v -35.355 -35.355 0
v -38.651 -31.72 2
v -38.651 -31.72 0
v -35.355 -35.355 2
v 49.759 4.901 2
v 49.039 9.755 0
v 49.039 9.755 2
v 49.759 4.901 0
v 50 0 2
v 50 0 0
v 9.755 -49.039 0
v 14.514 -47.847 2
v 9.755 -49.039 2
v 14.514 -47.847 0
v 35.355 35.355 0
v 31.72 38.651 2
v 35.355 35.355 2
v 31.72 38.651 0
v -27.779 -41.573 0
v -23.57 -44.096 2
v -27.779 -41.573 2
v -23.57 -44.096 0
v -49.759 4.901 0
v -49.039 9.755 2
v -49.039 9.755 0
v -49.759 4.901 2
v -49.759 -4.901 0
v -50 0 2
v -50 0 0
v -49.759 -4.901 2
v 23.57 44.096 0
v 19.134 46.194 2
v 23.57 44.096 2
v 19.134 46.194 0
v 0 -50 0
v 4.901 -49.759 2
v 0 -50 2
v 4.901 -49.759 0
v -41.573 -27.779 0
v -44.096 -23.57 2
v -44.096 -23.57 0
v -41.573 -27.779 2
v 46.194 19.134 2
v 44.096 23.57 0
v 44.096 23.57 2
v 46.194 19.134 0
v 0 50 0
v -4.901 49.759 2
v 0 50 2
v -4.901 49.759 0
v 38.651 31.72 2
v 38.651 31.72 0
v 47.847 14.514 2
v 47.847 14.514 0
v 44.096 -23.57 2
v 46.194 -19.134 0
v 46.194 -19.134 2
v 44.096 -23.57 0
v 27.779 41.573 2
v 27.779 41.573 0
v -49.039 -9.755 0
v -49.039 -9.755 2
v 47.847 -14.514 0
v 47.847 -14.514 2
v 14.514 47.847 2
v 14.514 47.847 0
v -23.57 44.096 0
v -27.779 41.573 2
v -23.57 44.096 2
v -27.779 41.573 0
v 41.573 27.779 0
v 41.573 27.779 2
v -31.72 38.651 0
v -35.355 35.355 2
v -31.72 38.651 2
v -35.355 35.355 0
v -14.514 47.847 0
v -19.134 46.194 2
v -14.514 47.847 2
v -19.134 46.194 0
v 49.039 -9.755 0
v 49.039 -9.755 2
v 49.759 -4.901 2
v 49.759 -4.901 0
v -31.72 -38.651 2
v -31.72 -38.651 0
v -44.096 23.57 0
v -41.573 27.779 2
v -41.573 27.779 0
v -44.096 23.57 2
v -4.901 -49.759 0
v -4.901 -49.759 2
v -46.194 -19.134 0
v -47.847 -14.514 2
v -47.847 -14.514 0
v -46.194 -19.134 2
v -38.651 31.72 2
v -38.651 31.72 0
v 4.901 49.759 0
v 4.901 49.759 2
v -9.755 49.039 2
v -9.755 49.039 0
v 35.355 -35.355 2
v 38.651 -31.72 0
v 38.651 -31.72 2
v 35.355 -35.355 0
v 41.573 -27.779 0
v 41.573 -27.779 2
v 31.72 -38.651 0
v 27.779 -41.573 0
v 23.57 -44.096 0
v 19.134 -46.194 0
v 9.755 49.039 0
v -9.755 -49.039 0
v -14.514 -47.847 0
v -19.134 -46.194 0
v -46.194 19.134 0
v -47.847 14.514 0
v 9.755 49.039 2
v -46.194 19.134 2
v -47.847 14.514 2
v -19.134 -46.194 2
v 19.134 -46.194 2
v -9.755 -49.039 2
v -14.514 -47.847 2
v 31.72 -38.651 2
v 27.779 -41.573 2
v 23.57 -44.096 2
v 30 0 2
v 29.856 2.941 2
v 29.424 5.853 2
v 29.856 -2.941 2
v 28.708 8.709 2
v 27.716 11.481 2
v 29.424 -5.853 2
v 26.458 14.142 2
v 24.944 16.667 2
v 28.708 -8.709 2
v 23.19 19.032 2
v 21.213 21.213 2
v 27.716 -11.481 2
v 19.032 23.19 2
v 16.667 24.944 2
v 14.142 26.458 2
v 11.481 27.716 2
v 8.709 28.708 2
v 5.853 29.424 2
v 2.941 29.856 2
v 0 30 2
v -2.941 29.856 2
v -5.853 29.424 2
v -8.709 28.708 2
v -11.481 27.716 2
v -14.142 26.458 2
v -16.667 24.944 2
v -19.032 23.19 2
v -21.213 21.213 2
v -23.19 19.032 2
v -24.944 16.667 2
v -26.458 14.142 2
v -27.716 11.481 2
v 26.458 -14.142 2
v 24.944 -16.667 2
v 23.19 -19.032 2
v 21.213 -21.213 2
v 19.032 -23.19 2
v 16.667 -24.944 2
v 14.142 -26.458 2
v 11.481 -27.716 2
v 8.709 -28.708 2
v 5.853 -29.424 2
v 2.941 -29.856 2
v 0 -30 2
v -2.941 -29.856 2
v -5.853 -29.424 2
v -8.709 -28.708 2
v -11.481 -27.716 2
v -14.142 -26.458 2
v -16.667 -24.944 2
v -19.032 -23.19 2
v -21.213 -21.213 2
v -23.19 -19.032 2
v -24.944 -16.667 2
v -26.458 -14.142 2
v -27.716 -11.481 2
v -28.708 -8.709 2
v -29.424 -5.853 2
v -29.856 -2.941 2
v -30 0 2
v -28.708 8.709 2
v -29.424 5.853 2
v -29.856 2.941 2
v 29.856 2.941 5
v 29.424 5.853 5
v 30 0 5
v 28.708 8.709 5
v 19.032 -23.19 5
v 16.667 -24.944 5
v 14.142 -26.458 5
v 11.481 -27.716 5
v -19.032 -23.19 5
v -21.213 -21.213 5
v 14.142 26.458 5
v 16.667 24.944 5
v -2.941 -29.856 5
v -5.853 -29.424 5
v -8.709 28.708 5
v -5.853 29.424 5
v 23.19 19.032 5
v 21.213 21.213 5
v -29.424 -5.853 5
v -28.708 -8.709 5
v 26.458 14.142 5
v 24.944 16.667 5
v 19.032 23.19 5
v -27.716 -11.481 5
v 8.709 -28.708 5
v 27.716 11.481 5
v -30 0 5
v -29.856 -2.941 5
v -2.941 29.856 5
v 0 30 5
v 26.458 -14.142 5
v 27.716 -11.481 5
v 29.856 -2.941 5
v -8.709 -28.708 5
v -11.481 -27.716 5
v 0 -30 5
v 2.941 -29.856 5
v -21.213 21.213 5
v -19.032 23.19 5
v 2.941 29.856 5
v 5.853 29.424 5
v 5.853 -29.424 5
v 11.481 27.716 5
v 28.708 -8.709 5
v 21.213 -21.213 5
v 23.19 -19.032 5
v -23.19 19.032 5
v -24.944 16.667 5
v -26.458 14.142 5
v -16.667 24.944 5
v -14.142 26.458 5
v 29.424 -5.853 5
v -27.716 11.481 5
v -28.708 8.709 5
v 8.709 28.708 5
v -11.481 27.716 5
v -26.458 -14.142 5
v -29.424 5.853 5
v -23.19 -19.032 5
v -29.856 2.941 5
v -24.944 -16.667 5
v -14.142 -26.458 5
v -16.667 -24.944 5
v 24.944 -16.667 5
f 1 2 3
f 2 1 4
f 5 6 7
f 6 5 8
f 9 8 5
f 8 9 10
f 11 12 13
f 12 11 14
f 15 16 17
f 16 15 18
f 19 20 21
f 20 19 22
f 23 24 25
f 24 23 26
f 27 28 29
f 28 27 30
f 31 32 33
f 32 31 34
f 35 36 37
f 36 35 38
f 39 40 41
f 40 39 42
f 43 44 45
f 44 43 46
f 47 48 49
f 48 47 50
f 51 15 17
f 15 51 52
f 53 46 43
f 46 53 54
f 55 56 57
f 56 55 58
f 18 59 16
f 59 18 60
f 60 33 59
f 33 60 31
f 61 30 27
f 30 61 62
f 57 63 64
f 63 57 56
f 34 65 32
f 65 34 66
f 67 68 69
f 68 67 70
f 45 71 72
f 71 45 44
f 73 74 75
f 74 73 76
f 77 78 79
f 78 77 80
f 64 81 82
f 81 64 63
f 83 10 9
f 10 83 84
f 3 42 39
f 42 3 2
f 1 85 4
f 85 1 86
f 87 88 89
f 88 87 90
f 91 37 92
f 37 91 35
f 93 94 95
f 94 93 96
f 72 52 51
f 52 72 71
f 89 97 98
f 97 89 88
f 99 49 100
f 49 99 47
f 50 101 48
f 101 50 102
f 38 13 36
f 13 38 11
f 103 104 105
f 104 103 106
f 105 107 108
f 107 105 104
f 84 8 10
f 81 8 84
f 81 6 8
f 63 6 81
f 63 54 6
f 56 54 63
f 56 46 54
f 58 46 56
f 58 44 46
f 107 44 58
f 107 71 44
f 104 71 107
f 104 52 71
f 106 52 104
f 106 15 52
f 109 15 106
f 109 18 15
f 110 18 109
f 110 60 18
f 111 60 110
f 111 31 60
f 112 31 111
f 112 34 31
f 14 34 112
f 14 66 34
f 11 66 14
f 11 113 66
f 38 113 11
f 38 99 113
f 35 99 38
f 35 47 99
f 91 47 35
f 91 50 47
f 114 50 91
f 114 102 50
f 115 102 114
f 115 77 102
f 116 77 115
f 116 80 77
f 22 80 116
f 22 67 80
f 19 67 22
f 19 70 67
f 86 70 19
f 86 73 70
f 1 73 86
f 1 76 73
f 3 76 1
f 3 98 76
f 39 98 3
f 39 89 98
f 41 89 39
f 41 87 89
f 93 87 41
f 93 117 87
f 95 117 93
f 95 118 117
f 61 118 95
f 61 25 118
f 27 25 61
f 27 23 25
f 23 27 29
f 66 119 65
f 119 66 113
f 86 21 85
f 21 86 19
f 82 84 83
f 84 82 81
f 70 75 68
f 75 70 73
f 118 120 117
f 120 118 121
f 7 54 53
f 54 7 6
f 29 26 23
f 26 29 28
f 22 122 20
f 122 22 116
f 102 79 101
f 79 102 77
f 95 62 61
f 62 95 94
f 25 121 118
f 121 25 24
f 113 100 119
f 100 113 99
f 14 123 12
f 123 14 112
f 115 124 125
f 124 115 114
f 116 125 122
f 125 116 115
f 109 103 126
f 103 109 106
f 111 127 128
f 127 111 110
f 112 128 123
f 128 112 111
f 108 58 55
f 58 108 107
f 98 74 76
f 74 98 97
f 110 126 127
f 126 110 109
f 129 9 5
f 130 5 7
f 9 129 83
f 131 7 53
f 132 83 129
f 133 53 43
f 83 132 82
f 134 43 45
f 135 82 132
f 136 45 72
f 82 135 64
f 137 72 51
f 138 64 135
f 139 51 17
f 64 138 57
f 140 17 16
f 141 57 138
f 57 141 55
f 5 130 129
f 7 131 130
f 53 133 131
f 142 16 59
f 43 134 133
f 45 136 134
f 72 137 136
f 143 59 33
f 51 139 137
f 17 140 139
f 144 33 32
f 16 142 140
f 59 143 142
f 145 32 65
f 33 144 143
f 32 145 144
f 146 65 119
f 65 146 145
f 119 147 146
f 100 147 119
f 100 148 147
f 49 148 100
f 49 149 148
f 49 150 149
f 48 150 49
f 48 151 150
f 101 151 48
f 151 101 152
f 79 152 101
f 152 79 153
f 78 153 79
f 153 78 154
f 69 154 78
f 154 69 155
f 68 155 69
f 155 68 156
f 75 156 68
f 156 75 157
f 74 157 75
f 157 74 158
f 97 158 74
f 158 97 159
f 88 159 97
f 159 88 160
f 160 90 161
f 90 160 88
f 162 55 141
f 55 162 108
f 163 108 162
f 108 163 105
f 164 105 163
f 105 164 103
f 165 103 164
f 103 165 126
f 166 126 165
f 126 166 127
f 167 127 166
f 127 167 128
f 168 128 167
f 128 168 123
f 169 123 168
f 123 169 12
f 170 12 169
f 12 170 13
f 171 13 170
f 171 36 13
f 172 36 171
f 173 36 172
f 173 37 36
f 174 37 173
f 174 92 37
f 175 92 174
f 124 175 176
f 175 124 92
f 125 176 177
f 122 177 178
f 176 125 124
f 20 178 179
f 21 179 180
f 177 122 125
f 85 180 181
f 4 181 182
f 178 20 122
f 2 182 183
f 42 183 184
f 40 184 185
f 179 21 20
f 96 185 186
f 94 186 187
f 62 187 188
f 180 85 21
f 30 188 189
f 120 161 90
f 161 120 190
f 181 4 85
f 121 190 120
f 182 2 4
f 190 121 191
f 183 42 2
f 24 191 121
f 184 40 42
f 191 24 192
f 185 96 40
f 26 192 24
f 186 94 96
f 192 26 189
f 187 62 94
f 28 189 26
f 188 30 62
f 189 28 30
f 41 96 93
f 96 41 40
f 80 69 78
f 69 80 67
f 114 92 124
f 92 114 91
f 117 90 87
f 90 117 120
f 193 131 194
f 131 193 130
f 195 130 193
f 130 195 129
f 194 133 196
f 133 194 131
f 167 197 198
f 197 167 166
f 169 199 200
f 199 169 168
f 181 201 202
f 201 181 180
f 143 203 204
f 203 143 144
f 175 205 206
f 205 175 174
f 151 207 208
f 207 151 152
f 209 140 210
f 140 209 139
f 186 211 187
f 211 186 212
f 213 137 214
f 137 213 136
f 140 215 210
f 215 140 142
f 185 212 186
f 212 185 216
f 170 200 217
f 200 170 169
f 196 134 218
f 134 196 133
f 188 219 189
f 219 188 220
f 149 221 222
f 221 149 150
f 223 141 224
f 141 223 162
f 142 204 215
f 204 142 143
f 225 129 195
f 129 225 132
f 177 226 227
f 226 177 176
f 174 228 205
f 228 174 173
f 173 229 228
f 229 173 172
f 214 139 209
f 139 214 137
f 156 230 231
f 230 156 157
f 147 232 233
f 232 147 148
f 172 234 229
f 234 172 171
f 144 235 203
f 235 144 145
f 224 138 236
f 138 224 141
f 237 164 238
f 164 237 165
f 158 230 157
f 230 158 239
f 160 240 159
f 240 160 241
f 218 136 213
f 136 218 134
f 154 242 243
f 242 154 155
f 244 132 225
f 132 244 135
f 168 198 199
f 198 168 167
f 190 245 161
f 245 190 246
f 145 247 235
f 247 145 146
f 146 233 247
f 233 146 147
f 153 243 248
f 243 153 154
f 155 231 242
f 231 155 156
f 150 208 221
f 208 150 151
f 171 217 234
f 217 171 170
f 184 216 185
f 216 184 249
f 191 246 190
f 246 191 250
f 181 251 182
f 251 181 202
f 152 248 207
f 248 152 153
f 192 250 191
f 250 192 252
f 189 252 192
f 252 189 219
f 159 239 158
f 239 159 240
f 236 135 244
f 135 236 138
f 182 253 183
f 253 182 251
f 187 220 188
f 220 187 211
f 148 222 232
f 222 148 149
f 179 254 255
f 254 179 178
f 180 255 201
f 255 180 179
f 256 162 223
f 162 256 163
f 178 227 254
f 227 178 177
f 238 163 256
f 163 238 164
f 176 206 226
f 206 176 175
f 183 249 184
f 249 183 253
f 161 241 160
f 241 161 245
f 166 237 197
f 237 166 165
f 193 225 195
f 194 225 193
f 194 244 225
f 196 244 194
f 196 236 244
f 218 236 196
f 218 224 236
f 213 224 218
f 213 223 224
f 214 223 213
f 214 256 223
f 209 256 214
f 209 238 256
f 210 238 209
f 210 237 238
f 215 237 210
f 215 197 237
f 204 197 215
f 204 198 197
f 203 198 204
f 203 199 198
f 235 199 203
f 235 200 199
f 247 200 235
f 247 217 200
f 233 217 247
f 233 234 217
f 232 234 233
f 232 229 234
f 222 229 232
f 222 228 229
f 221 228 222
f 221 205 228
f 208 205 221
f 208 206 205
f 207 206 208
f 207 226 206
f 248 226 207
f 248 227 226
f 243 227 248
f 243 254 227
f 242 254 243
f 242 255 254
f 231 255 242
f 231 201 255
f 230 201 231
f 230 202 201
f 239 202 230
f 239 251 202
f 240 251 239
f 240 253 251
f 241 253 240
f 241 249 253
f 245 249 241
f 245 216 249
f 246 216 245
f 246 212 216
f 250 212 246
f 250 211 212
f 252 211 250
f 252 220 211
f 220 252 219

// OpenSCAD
module hex_cutout(size, height) {
    rotate([0, 0, 30])
    linear_extrude(height)
    polygon(points=[[0, size], [size * cos(PI/3), size * sin(PI/3)], [size * cos(2*PI/3), size * sin(2*PI/3)], 
                    [0, -size], [-size * cos(PI/3), -size * sin(PI/3)], [-size * cos(2*PI/3), -size * sin(2*PI/3)]]);
}

module triangular_web(size, height) {
    linear_extrude(height)
    polygon(points=[[0, size], [size * cos(PI/3), size * sin(PI/3)], [-size * cos(PI/3), size * sin(PI/3)]]);
}

module disk_with_features() {
    difference() {
        union() {
            // Base flange
            cylinder(h=2, r=50, $fn=64);
            // Raised boss
            translate([0, 0, 2])
            cylinder(h=3, r=30, $fn=64);
        }
        // Hexagonal cutouts
        translate([0, 0, 1])
        hex_cutout(10, 4);
        translate([20, 0, 1])
        hex_cutout(10, 4);
        translate([-20, 0, 1])
        hex_cutout(10, 4);
    }
    
    // Triangular webs
    translate([0, 0, 1])
    union() {
        for (angle = [0, 120, 240]) {
            rotate([0, 0, angle])
            triangular_web(20, 1);
        }
    }
}

disk_with_features();
